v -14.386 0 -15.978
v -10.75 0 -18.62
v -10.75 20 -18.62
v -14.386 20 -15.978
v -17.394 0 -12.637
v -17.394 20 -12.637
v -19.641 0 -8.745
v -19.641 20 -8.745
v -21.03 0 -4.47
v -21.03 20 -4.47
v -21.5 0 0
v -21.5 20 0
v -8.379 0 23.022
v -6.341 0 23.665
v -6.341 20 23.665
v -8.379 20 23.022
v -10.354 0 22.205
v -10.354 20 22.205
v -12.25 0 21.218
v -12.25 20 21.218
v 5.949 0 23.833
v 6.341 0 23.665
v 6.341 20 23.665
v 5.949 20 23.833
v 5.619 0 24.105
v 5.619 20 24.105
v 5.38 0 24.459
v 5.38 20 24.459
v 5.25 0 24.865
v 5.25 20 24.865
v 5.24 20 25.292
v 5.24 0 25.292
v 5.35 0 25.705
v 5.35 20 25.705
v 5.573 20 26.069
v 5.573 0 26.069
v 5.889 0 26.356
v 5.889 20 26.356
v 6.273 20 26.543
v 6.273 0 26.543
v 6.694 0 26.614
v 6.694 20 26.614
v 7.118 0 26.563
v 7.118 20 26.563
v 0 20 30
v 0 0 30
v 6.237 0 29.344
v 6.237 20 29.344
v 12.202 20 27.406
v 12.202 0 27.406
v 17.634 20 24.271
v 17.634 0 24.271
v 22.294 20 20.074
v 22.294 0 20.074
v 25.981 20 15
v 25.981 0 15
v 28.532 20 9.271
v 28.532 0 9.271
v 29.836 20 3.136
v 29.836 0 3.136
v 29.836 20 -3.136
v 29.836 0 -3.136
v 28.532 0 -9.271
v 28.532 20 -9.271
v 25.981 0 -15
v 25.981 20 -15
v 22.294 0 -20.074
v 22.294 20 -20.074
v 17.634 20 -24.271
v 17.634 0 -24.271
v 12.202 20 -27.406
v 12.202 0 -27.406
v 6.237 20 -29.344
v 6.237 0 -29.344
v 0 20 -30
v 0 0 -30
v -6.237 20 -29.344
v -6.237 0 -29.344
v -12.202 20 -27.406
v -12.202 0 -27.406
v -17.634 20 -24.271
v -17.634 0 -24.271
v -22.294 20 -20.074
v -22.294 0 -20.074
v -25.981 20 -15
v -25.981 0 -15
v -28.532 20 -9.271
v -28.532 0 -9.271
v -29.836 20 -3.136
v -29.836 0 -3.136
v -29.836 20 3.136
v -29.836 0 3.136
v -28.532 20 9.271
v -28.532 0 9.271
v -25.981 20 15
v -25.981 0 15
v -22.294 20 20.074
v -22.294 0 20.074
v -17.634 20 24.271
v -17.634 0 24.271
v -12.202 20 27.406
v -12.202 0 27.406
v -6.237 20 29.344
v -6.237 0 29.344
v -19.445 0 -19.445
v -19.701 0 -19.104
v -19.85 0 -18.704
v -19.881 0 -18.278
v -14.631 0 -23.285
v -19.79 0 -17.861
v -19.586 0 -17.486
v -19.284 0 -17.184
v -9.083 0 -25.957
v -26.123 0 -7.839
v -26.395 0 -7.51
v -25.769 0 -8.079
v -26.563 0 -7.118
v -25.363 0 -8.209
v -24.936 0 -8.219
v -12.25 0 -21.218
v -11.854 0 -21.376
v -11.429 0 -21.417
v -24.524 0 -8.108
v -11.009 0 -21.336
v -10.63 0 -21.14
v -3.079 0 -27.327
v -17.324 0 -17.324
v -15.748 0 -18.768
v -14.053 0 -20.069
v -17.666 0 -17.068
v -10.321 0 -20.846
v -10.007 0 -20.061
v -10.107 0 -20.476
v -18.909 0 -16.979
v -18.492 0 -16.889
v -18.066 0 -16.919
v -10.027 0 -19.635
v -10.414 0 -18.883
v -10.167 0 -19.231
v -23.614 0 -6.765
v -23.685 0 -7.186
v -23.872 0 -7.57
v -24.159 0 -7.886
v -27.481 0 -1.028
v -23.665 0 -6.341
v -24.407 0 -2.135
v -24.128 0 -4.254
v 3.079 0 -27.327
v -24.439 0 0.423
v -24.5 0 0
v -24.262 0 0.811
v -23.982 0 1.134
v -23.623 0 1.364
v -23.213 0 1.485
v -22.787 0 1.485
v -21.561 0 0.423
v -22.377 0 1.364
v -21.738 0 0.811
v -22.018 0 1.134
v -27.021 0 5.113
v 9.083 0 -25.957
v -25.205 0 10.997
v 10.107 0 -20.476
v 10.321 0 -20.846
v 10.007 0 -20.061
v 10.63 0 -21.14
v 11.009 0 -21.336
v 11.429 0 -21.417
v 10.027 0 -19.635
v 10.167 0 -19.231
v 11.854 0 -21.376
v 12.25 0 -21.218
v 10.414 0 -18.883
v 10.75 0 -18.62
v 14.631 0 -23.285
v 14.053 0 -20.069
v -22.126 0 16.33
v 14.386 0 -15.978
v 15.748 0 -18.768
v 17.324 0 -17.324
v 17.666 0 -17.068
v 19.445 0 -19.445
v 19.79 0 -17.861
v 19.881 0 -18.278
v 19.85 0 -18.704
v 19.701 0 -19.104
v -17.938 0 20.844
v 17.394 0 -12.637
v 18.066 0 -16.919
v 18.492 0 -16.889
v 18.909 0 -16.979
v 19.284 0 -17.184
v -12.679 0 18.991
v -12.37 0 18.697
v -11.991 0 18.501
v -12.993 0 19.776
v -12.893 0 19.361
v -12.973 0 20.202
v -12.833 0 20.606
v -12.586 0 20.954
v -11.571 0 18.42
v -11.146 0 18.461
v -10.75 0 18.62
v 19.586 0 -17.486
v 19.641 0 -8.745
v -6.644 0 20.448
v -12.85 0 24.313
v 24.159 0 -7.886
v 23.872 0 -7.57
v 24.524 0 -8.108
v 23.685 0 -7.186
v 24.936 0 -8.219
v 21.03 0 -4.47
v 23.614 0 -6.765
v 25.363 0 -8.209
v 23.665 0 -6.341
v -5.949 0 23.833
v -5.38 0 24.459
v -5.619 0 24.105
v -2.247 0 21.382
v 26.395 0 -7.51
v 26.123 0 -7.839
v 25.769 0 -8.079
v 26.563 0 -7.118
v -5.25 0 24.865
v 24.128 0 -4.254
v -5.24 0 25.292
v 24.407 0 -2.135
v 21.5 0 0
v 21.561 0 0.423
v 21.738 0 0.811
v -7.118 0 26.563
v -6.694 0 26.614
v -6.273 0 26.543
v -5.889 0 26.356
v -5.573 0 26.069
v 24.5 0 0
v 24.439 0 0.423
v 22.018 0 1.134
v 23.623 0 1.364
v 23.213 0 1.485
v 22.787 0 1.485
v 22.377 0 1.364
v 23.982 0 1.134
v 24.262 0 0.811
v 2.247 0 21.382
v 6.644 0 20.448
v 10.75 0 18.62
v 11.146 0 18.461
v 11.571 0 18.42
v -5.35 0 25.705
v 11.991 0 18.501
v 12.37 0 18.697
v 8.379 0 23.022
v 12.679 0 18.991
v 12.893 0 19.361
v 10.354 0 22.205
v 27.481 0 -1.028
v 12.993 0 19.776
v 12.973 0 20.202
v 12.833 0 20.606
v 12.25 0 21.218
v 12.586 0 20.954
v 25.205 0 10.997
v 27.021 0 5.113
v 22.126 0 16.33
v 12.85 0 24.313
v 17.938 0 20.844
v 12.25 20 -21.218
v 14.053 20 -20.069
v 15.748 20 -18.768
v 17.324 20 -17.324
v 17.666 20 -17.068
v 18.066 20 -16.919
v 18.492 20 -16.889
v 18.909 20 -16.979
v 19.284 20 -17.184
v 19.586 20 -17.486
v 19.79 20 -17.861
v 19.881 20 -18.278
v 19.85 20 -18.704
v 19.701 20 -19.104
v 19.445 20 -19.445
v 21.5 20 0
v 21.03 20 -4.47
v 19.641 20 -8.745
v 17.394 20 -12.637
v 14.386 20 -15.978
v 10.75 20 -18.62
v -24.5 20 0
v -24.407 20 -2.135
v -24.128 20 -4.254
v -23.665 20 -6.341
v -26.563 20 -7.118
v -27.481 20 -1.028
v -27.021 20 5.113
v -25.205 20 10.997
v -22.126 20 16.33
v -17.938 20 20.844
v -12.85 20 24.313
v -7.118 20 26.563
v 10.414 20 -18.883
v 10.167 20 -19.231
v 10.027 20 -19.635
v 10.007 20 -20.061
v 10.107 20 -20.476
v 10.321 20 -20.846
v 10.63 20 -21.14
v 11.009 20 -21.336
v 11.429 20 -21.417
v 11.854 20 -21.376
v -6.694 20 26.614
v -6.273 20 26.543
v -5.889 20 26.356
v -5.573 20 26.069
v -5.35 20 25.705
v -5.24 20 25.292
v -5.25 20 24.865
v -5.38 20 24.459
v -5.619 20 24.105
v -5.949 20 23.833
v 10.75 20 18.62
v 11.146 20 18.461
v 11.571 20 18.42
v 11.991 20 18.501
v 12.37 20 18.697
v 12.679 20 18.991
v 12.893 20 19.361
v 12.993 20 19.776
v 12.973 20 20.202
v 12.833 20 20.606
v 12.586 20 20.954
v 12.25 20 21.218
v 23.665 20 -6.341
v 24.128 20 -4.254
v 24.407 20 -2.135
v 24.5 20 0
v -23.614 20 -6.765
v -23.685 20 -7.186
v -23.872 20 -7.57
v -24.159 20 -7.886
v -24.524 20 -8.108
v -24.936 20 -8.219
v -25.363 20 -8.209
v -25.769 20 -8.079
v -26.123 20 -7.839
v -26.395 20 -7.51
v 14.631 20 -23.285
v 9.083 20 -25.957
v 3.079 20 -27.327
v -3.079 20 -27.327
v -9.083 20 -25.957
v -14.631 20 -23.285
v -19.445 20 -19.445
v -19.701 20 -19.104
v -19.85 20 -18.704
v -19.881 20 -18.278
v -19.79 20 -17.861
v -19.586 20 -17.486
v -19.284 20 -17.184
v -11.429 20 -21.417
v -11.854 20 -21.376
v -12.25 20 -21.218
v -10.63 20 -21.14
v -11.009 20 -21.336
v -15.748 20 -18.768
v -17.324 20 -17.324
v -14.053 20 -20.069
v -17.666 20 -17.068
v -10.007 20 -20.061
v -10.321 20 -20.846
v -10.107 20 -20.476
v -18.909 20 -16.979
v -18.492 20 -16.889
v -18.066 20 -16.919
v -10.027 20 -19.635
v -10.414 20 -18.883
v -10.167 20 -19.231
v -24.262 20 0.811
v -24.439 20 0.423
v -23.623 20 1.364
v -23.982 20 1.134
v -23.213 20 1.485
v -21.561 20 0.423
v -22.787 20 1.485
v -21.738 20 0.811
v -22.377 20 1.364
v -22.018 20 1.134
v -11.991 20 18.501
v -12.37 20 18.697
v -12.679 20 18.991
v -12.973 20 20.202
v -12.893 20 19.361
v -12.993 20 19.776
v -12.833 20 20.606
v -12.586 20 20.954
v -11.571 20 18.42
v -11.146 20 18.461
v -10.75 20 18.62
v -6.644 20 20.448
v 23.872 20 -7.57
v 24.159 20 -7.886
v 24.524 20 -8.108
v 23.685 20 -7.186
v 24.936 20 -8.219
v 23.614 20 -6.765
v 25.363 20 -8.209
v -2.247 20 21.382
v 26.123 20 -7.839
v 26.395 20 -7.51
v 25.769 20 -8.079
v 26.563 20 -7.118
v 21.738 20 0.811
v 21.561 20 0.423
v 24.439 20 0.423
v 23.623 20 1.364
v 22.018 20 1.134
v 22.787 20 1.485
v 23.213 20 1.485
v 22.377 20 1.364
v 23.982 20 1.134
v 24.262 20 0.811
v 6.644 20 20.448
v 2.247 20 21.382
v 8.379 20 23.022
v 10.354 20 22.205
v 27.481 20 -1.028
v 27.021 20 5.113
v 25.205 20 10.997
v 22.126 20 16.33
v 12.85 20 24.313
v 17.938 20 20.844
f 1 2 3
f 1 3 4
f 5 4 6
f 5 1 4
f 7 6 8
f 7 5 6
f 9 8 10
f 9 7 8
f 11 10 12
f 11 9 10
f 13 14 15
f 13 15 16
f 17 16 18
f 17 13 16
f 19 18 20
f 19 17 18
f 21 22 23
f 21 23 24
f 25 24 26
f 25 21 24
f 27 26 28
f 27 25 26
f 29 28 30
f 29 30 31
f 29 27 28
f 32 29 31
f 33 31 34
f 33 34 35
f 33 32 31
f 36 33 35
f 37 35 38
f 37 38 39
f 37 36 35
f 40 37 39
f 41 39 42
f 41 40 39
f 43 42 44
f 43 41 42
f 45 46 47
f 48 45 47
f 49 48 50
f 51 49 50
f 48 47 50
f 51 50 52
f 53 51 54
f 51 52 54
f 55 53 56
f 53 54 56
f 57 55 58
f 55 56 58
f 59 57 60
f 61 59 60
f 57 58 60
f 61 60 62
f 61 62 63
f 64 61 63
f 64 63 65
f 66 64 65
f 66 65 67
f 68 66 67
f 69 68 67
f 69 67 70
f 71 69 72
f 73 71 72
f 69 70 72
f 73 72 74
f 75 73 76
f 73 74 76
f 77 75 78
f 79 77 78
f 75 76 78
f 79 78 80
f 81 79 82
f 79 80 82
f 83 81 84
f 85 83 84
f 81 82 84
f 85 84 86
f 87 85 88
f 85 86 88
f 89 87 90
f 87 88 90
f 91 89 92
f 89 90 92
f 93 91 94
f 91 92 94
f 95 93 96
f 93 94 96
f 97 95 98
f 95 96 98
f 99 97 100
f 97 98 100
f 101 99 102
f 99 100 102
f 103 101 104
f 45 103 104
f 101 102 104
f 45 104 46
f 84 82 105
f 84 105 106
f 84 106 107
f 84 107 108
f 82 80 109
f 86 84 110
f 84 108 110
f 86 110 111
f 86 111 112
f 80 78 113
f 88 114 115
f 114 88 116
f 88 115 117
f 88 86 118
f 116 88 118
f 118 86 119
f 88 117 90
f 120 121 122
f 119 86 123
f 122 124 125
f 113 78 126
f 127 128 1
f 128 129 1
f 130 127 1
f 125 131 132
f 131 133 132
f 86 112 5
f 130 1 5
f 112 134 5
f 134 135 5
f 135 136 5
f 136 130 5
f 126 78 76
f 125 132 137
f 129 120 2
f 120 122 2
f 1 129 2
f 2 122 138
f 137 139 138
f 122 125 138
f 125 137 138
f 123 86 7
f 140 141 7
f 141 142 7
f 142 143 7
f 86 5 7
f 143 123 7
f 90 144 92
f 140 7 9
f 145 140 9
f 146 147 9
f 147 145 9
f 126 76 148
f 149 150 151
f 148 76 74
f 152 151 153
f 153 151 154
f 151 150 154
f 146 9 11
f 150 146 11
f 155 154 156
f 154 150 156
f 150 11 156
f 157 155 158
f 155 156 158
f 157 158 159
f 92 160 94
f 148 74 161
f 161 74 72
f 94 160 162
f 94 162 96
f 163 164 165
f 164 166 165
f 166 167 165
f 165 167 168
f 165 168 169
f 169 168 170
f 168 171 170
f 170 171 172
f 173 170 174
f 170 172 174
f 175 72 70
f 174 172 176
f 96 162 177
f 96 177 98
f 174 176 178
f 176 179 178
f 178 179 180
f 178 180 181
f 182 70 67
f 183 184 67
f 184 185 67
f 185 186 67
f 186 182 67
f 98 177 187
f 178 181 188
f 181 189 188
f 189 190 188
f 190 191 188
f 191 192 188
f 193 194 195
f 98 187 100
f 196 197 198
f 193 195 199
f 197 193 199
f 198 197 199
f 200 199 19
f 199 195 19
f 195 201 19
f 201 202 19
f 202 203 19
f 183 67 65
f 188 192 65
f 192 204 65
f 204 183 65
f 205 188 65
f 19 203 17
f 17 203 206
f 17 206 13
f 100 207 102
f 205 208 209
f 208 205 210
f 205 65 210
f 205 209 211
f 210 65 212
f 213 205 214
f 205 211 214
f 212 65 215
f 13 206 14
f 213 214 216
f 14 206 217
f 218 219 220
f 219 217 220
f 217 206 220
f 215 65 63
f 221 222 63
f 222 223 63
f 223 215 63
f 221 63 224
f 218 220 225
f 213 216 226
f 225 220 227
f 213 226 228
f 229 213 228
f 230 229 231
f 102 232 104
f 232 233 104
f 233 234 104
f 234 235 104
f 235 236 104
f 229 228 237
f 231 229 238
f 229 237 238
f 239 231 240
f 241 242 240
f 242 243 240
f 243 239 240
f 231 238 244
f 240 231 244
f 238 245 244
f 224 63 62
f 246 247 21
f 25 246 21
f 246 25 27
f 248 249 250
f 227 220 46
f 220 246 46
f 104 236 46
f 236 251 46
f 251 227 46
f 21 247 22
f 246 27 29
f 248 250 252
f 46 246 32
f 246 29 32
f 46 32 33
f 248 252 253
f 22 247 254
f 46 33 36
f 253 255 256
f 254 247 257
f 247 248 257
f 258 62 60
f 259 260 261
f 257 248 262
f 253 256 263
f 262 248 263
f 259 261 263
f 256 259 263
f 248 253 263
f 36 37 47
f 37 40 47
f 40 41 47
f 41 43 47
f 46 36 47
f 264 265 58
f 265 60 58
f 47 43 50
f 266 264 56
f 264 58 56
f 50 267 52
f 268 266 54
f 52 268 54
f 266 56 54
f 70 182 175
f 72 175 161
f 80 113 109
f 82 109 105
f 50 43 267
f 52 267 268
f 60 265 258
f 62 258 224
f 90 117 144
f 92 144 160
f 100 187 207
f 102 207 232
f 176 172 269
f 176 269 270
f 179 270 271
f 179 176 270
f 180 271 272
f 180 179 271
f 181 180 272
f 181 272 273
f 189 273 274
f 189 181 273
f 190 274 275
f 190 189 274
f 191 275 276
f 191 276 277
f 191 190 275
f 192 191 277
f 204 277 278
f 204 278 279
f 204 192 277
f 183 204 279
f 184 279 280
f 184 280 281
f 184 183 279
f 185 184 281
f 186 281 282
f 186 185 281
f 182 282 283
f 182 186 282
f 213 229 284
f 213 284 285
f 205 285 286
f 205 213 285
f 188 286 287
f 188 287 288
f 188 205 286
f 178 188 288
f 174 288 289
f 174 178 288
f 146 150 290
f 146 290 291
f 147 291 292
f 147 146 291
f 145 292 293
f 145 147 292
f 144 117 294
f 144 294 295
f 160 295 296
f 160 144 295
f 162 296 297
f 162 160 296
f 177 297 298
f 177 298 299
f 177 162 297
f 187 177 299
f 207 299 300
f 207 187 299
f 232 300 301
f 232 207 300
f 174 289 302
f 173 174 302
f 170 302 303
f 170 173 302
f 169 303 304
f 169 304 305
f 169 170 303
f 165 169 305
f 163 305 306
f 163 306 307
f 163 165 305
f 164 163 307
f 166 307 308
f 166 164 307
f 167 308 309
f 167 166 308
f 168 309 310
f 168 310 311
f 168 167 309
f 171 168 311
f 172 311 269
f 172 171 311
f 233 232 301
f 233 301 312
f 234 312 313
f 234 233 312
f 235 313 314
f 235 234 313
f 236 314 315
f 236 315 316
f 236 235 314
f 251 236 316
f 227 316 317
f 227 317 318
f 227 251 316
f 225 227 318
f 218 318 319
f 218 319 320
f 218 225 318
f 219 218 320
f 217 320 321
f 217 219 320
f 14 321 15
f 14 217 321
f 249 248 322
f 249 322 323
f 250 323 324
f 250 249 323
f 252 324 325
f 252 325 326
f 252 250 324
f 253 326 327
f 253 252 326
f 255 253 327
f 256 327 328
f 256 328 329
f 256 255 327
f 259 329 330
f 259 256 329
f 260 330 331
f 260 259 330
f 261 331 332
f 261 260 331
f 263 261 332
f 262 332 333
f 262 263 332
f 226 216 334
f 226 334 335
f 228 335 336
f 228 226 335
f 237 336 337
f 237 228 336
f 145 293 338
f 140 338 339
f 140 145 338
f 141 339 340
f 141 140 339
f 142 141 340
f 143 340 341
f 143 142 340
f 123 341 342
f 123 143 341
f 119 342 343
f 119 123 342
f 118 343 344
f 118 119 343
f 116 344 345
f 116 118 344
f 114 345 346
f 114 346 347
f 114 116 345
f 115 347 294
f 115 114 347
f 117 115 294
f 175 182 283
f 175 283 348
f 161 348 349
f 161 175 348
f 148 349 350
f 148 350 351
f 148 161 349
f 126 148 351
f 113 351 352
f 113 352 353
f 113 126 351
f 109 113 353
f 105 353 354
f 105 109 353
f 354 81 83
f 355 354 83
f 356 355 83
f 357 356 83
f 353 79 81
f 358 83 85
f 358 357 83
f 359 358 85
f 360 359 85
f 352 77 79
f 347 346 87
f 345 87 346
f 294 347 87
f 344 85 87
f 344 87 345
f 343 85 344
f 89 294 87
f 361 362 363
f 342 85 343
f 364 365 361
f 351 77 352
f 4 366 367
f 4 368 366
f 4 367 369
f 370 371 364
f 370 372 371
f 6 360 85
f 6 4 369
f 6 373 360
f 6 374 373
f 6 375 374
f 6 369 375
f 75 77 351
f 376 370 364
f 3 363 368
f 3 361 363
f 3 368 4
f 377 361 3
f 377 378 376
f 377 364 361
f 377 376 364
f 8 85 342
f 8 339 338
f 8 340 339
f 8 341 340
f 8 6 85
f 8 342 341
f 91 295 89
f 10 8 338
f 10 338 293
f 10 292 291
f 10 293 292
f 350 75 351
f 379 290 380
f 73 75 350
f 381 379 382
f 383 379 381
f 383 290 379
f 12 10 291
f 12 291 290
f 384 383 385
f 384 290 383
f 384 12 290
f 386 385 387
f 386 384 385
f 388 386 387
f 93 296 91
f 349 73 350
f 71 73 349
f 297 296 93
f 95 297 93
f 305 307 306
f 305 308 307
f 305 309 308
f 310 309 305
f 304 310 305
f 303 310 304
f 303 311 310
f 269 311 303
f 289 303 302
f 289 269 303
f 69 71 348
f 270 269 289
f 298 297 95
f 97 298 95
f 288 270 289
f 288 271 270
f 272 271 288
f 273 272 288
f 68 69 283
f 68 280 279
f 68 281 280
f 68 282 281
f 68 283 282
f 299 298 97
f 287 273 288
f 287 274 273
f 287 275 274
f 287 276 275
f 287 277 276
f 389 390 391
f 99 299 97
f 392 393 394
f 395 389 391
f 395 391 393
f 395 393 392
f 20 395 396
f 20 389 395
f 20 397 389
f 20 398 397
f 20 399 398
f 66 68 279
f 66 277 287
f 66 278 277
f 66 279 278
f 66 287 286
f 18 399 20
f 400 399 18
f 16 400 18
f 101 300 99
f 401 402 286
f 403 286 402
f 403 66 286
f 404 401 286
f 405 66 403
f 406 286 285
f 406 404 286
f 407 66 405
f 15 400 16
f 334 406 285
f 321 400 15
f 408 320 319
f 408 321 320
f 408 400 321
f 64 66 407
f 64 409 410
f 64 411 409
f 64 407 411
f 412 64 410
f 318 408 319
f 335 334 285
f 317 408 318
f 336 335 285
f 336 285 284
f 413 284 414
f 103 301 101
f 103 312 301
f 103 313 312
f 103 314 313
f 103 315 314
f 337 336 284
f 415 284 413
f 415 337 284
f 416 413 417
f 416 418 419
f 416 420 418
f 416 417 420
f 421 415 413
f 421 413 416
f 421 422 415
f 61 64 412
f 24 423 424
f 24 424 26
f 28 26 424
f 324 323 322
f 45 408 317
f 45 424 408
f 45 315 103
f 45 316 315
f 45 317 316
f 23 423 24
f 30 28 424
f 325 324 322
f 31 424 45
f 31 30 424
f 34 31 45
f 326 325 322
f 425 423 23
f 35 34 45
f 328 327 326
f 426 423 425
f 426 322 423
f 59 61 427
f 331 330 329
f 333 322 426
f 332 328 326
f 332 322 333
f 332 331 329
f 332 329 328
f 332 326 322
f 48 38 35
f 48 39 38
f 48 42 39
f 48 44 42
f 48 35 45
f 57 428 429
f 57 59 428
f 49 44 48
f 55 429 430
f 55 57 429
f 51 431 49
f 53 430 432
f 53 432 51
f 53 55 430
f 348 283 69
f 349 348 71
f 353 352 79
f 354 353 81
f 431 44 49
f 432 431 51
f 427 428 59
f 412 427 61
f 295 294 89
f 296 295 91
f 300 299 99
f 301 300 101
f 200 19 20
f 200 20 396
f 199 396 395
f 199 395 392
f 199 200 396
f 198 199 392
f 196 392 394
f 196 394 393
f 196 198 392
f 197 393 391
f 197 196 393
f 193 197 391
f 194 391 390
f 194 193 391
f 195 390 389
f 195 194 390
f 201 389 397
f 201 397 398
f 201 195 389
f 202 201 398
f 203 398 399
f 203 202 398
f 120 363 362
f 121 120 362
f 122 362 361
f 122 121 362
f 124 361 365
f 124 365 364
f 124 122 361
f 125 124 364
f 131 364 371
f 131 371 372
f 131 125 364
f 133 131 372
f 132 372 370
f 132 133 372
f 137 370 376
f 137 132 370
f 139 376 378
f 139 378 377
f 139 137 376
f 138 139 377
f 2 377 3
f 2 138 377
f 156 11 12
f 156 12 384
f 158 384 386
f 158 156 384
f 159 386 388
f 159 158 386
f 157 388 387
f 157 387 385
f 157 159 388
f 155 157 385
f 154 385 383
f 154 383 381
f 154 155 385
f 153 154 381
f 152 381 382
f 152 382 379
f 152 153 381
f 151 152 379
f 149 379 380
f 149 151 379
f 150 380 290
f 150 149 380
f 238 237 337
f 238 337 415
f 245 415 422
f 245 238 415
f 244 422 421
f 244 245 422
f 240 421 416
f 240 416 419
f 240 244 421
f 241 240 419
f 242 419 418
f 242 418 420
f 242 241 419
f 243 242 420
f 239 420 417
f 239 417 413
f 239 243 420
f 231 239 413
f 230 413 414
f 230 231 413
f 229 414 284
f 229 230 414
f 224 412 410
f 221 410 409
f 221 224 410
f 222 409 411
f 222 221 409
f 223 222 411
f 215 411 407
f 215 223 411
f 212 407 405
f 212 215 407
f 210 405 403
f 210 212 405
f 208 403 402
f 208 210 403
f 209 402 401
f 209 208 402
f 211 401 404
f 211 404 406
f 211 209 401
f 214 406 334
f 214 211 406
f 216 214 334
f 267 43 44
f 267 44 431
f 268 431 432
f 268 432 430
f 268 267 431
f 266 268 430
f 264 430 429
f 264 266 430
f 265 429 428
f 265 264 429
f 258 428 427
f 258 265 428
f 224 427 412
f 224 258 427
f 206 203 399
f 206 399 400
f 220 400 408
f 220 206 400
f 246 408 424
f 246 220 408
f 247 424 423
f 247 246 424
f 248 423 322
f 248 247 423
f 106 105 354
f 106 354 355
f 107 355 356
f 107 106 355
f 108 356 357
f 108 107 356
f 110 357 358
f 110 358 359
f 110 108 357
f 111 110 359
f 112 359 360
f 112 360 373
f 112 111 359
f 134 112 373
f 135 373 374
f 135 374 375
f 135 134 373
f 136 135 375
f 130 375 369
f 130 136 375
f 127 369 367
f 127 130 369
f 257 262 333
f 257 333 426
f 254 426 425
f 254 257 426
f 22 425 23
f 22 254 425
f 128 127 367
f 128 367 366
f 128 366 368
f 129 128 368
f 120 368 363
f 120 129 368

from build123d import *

# Parameters (mm, degrees)
ESQUISSE1_R          = 30
ESQUISSE1_R_2        = 19
BOSS_EXTRU_1_DEPTH   = 20
EMPREINTE1_OUTLINE_R = 19
EMPREINTE1_DEPTH     = 20


# Read off the part's stored shape, not the designer's step: Empreinte1
with BuildPart() as part:
    # Esquisse1 → Boss.-Extru.1 (new body)
    with BuildSketch(Plane(origin=(0, 0, 0), x_dir=(1, 0, 0), z_dir=(0, 1, 0))):
        with Locations(Location((0, 0, 0), (0, 0, 270))):
            Circle(ESQUISSE1_R)
        with Locations(Location((0, 0, 0), (0, 0, 270))):
            Circle(ESQUISSE1_R_2, mode=Mode.SUBTRACT)
    extrude(amount=BOSS_EXTRU_1_DEPTH)

    # Empreinte1 outline → Empreinte1 (cut)
    with BuildSketch(Plane(origin=(0, 0, 0), x_dir=(1, 0, 0), z_dir=(0, 1, 0))):
        with BuildLine():
            ThreePointArc((-12.25, 21.217622393), (-10.200961894, 20.668584287), (-10.75, 18.619546181))
            ThreePointArc((-10.75, 18.619546181), (-18.619546181, 10.75), (-21.5, 0))
            ThreePointArc((-21.5, 0), (-23, -1.5), (-24.5, 0))
            ThreePointArc((-24.5, 0), (-24.290399104, 3.197891709), (-23.665182744, 6.341066605))
            ThreePointArc((-23.665182744, 6.341066605), (-24.725842916, 8.178183912), (-26.562960223, 7.11752374))
            ThreePointArc((-26.562960223, 7.11752374), (-23.815698604, -13.75), (-7.11752374, -26.562960223))
            ThreePointArc((-7.11752374, -26.562960223), (-5.280406433, -25.502300051), (-6.341066605, -23.665182744))
            ThreePointArc((-6.341066605, -23.665182744), (-9.375744093, -22.635048547), (-12.25, -21.217622393))
            ThreePointArc((-12.25, -21.217622393), (-12.799038106, -19.168584287), (-10.75, -18.619546181))
            ThreePointArc((-10.75, -18.619546181), (0, -21.5), (10.75, -18.619546181))
            ThreePointArc((10.75, -18.619546181), (12.799038106, -19.168584287), (12.25, -21.217622393))
            ThreePointArc((12.25, -21.217622393), (9.375744093, -22.635048547), (6.341066605, -23.665182744))
            ThreePointArc((6.341066605, -23.665182744), (5.280406433, -25.502300051), (7.11752374, -26.562960223))
            ThreePointArc((7.11752374, -26.562960223), (23.815698604, -13.75), (26.562960223, 7.11752374))
            ThreePointArc((26.562960223, 7.11752374), (24.725842916, 8.178183912), (23.665182744, 6.341066605))
            ThreePointArc((23.665182744, 6.341066605), (24.290399104, 3.197891709), (24.5, 0))
            ThreePointArc((24.5, 0), (23, -1.5), (21.5, 0))
            ThreePointArc((21.5, 0), (18.619546181, 10.75), (10.75, 18.619546181))
            ThreePointArc((10.75, 18.619546181), (10.200961894, 20.668584287), (12.25, 21.217622393))
            ThreePointArc((12.25, 21.217622393), (14.914655011, 19.437156837), (17.324116139, 17.324116139))
            ThreePointArc((17.324116139, 17.324116139), (19.445436483, 17.324116139), (19.445436483, 19.445436483))
            ThreePointArc((19.445436483, 19.445436483), (0, 27.5), (-19.445436483, 19.445436483))
            ThreePointArc((-19.445436483, 19.445436483), (-19.445436483, 17.324116139), (-17.324116139, 17.324116139))
            ThreePointArc((-17.324116139, 17.324116139), (-14.914655011, 19.437156837), (-12.25, 21.217622393))
        make_face()
        Circle(EMPREINTE1_OUTLINE_R, mode=Mode.SUBTRACT)
    extrude(amount=EMPREINTE1_DEPTH, mode=Mode.SUBTRACT)


solid = part.part
